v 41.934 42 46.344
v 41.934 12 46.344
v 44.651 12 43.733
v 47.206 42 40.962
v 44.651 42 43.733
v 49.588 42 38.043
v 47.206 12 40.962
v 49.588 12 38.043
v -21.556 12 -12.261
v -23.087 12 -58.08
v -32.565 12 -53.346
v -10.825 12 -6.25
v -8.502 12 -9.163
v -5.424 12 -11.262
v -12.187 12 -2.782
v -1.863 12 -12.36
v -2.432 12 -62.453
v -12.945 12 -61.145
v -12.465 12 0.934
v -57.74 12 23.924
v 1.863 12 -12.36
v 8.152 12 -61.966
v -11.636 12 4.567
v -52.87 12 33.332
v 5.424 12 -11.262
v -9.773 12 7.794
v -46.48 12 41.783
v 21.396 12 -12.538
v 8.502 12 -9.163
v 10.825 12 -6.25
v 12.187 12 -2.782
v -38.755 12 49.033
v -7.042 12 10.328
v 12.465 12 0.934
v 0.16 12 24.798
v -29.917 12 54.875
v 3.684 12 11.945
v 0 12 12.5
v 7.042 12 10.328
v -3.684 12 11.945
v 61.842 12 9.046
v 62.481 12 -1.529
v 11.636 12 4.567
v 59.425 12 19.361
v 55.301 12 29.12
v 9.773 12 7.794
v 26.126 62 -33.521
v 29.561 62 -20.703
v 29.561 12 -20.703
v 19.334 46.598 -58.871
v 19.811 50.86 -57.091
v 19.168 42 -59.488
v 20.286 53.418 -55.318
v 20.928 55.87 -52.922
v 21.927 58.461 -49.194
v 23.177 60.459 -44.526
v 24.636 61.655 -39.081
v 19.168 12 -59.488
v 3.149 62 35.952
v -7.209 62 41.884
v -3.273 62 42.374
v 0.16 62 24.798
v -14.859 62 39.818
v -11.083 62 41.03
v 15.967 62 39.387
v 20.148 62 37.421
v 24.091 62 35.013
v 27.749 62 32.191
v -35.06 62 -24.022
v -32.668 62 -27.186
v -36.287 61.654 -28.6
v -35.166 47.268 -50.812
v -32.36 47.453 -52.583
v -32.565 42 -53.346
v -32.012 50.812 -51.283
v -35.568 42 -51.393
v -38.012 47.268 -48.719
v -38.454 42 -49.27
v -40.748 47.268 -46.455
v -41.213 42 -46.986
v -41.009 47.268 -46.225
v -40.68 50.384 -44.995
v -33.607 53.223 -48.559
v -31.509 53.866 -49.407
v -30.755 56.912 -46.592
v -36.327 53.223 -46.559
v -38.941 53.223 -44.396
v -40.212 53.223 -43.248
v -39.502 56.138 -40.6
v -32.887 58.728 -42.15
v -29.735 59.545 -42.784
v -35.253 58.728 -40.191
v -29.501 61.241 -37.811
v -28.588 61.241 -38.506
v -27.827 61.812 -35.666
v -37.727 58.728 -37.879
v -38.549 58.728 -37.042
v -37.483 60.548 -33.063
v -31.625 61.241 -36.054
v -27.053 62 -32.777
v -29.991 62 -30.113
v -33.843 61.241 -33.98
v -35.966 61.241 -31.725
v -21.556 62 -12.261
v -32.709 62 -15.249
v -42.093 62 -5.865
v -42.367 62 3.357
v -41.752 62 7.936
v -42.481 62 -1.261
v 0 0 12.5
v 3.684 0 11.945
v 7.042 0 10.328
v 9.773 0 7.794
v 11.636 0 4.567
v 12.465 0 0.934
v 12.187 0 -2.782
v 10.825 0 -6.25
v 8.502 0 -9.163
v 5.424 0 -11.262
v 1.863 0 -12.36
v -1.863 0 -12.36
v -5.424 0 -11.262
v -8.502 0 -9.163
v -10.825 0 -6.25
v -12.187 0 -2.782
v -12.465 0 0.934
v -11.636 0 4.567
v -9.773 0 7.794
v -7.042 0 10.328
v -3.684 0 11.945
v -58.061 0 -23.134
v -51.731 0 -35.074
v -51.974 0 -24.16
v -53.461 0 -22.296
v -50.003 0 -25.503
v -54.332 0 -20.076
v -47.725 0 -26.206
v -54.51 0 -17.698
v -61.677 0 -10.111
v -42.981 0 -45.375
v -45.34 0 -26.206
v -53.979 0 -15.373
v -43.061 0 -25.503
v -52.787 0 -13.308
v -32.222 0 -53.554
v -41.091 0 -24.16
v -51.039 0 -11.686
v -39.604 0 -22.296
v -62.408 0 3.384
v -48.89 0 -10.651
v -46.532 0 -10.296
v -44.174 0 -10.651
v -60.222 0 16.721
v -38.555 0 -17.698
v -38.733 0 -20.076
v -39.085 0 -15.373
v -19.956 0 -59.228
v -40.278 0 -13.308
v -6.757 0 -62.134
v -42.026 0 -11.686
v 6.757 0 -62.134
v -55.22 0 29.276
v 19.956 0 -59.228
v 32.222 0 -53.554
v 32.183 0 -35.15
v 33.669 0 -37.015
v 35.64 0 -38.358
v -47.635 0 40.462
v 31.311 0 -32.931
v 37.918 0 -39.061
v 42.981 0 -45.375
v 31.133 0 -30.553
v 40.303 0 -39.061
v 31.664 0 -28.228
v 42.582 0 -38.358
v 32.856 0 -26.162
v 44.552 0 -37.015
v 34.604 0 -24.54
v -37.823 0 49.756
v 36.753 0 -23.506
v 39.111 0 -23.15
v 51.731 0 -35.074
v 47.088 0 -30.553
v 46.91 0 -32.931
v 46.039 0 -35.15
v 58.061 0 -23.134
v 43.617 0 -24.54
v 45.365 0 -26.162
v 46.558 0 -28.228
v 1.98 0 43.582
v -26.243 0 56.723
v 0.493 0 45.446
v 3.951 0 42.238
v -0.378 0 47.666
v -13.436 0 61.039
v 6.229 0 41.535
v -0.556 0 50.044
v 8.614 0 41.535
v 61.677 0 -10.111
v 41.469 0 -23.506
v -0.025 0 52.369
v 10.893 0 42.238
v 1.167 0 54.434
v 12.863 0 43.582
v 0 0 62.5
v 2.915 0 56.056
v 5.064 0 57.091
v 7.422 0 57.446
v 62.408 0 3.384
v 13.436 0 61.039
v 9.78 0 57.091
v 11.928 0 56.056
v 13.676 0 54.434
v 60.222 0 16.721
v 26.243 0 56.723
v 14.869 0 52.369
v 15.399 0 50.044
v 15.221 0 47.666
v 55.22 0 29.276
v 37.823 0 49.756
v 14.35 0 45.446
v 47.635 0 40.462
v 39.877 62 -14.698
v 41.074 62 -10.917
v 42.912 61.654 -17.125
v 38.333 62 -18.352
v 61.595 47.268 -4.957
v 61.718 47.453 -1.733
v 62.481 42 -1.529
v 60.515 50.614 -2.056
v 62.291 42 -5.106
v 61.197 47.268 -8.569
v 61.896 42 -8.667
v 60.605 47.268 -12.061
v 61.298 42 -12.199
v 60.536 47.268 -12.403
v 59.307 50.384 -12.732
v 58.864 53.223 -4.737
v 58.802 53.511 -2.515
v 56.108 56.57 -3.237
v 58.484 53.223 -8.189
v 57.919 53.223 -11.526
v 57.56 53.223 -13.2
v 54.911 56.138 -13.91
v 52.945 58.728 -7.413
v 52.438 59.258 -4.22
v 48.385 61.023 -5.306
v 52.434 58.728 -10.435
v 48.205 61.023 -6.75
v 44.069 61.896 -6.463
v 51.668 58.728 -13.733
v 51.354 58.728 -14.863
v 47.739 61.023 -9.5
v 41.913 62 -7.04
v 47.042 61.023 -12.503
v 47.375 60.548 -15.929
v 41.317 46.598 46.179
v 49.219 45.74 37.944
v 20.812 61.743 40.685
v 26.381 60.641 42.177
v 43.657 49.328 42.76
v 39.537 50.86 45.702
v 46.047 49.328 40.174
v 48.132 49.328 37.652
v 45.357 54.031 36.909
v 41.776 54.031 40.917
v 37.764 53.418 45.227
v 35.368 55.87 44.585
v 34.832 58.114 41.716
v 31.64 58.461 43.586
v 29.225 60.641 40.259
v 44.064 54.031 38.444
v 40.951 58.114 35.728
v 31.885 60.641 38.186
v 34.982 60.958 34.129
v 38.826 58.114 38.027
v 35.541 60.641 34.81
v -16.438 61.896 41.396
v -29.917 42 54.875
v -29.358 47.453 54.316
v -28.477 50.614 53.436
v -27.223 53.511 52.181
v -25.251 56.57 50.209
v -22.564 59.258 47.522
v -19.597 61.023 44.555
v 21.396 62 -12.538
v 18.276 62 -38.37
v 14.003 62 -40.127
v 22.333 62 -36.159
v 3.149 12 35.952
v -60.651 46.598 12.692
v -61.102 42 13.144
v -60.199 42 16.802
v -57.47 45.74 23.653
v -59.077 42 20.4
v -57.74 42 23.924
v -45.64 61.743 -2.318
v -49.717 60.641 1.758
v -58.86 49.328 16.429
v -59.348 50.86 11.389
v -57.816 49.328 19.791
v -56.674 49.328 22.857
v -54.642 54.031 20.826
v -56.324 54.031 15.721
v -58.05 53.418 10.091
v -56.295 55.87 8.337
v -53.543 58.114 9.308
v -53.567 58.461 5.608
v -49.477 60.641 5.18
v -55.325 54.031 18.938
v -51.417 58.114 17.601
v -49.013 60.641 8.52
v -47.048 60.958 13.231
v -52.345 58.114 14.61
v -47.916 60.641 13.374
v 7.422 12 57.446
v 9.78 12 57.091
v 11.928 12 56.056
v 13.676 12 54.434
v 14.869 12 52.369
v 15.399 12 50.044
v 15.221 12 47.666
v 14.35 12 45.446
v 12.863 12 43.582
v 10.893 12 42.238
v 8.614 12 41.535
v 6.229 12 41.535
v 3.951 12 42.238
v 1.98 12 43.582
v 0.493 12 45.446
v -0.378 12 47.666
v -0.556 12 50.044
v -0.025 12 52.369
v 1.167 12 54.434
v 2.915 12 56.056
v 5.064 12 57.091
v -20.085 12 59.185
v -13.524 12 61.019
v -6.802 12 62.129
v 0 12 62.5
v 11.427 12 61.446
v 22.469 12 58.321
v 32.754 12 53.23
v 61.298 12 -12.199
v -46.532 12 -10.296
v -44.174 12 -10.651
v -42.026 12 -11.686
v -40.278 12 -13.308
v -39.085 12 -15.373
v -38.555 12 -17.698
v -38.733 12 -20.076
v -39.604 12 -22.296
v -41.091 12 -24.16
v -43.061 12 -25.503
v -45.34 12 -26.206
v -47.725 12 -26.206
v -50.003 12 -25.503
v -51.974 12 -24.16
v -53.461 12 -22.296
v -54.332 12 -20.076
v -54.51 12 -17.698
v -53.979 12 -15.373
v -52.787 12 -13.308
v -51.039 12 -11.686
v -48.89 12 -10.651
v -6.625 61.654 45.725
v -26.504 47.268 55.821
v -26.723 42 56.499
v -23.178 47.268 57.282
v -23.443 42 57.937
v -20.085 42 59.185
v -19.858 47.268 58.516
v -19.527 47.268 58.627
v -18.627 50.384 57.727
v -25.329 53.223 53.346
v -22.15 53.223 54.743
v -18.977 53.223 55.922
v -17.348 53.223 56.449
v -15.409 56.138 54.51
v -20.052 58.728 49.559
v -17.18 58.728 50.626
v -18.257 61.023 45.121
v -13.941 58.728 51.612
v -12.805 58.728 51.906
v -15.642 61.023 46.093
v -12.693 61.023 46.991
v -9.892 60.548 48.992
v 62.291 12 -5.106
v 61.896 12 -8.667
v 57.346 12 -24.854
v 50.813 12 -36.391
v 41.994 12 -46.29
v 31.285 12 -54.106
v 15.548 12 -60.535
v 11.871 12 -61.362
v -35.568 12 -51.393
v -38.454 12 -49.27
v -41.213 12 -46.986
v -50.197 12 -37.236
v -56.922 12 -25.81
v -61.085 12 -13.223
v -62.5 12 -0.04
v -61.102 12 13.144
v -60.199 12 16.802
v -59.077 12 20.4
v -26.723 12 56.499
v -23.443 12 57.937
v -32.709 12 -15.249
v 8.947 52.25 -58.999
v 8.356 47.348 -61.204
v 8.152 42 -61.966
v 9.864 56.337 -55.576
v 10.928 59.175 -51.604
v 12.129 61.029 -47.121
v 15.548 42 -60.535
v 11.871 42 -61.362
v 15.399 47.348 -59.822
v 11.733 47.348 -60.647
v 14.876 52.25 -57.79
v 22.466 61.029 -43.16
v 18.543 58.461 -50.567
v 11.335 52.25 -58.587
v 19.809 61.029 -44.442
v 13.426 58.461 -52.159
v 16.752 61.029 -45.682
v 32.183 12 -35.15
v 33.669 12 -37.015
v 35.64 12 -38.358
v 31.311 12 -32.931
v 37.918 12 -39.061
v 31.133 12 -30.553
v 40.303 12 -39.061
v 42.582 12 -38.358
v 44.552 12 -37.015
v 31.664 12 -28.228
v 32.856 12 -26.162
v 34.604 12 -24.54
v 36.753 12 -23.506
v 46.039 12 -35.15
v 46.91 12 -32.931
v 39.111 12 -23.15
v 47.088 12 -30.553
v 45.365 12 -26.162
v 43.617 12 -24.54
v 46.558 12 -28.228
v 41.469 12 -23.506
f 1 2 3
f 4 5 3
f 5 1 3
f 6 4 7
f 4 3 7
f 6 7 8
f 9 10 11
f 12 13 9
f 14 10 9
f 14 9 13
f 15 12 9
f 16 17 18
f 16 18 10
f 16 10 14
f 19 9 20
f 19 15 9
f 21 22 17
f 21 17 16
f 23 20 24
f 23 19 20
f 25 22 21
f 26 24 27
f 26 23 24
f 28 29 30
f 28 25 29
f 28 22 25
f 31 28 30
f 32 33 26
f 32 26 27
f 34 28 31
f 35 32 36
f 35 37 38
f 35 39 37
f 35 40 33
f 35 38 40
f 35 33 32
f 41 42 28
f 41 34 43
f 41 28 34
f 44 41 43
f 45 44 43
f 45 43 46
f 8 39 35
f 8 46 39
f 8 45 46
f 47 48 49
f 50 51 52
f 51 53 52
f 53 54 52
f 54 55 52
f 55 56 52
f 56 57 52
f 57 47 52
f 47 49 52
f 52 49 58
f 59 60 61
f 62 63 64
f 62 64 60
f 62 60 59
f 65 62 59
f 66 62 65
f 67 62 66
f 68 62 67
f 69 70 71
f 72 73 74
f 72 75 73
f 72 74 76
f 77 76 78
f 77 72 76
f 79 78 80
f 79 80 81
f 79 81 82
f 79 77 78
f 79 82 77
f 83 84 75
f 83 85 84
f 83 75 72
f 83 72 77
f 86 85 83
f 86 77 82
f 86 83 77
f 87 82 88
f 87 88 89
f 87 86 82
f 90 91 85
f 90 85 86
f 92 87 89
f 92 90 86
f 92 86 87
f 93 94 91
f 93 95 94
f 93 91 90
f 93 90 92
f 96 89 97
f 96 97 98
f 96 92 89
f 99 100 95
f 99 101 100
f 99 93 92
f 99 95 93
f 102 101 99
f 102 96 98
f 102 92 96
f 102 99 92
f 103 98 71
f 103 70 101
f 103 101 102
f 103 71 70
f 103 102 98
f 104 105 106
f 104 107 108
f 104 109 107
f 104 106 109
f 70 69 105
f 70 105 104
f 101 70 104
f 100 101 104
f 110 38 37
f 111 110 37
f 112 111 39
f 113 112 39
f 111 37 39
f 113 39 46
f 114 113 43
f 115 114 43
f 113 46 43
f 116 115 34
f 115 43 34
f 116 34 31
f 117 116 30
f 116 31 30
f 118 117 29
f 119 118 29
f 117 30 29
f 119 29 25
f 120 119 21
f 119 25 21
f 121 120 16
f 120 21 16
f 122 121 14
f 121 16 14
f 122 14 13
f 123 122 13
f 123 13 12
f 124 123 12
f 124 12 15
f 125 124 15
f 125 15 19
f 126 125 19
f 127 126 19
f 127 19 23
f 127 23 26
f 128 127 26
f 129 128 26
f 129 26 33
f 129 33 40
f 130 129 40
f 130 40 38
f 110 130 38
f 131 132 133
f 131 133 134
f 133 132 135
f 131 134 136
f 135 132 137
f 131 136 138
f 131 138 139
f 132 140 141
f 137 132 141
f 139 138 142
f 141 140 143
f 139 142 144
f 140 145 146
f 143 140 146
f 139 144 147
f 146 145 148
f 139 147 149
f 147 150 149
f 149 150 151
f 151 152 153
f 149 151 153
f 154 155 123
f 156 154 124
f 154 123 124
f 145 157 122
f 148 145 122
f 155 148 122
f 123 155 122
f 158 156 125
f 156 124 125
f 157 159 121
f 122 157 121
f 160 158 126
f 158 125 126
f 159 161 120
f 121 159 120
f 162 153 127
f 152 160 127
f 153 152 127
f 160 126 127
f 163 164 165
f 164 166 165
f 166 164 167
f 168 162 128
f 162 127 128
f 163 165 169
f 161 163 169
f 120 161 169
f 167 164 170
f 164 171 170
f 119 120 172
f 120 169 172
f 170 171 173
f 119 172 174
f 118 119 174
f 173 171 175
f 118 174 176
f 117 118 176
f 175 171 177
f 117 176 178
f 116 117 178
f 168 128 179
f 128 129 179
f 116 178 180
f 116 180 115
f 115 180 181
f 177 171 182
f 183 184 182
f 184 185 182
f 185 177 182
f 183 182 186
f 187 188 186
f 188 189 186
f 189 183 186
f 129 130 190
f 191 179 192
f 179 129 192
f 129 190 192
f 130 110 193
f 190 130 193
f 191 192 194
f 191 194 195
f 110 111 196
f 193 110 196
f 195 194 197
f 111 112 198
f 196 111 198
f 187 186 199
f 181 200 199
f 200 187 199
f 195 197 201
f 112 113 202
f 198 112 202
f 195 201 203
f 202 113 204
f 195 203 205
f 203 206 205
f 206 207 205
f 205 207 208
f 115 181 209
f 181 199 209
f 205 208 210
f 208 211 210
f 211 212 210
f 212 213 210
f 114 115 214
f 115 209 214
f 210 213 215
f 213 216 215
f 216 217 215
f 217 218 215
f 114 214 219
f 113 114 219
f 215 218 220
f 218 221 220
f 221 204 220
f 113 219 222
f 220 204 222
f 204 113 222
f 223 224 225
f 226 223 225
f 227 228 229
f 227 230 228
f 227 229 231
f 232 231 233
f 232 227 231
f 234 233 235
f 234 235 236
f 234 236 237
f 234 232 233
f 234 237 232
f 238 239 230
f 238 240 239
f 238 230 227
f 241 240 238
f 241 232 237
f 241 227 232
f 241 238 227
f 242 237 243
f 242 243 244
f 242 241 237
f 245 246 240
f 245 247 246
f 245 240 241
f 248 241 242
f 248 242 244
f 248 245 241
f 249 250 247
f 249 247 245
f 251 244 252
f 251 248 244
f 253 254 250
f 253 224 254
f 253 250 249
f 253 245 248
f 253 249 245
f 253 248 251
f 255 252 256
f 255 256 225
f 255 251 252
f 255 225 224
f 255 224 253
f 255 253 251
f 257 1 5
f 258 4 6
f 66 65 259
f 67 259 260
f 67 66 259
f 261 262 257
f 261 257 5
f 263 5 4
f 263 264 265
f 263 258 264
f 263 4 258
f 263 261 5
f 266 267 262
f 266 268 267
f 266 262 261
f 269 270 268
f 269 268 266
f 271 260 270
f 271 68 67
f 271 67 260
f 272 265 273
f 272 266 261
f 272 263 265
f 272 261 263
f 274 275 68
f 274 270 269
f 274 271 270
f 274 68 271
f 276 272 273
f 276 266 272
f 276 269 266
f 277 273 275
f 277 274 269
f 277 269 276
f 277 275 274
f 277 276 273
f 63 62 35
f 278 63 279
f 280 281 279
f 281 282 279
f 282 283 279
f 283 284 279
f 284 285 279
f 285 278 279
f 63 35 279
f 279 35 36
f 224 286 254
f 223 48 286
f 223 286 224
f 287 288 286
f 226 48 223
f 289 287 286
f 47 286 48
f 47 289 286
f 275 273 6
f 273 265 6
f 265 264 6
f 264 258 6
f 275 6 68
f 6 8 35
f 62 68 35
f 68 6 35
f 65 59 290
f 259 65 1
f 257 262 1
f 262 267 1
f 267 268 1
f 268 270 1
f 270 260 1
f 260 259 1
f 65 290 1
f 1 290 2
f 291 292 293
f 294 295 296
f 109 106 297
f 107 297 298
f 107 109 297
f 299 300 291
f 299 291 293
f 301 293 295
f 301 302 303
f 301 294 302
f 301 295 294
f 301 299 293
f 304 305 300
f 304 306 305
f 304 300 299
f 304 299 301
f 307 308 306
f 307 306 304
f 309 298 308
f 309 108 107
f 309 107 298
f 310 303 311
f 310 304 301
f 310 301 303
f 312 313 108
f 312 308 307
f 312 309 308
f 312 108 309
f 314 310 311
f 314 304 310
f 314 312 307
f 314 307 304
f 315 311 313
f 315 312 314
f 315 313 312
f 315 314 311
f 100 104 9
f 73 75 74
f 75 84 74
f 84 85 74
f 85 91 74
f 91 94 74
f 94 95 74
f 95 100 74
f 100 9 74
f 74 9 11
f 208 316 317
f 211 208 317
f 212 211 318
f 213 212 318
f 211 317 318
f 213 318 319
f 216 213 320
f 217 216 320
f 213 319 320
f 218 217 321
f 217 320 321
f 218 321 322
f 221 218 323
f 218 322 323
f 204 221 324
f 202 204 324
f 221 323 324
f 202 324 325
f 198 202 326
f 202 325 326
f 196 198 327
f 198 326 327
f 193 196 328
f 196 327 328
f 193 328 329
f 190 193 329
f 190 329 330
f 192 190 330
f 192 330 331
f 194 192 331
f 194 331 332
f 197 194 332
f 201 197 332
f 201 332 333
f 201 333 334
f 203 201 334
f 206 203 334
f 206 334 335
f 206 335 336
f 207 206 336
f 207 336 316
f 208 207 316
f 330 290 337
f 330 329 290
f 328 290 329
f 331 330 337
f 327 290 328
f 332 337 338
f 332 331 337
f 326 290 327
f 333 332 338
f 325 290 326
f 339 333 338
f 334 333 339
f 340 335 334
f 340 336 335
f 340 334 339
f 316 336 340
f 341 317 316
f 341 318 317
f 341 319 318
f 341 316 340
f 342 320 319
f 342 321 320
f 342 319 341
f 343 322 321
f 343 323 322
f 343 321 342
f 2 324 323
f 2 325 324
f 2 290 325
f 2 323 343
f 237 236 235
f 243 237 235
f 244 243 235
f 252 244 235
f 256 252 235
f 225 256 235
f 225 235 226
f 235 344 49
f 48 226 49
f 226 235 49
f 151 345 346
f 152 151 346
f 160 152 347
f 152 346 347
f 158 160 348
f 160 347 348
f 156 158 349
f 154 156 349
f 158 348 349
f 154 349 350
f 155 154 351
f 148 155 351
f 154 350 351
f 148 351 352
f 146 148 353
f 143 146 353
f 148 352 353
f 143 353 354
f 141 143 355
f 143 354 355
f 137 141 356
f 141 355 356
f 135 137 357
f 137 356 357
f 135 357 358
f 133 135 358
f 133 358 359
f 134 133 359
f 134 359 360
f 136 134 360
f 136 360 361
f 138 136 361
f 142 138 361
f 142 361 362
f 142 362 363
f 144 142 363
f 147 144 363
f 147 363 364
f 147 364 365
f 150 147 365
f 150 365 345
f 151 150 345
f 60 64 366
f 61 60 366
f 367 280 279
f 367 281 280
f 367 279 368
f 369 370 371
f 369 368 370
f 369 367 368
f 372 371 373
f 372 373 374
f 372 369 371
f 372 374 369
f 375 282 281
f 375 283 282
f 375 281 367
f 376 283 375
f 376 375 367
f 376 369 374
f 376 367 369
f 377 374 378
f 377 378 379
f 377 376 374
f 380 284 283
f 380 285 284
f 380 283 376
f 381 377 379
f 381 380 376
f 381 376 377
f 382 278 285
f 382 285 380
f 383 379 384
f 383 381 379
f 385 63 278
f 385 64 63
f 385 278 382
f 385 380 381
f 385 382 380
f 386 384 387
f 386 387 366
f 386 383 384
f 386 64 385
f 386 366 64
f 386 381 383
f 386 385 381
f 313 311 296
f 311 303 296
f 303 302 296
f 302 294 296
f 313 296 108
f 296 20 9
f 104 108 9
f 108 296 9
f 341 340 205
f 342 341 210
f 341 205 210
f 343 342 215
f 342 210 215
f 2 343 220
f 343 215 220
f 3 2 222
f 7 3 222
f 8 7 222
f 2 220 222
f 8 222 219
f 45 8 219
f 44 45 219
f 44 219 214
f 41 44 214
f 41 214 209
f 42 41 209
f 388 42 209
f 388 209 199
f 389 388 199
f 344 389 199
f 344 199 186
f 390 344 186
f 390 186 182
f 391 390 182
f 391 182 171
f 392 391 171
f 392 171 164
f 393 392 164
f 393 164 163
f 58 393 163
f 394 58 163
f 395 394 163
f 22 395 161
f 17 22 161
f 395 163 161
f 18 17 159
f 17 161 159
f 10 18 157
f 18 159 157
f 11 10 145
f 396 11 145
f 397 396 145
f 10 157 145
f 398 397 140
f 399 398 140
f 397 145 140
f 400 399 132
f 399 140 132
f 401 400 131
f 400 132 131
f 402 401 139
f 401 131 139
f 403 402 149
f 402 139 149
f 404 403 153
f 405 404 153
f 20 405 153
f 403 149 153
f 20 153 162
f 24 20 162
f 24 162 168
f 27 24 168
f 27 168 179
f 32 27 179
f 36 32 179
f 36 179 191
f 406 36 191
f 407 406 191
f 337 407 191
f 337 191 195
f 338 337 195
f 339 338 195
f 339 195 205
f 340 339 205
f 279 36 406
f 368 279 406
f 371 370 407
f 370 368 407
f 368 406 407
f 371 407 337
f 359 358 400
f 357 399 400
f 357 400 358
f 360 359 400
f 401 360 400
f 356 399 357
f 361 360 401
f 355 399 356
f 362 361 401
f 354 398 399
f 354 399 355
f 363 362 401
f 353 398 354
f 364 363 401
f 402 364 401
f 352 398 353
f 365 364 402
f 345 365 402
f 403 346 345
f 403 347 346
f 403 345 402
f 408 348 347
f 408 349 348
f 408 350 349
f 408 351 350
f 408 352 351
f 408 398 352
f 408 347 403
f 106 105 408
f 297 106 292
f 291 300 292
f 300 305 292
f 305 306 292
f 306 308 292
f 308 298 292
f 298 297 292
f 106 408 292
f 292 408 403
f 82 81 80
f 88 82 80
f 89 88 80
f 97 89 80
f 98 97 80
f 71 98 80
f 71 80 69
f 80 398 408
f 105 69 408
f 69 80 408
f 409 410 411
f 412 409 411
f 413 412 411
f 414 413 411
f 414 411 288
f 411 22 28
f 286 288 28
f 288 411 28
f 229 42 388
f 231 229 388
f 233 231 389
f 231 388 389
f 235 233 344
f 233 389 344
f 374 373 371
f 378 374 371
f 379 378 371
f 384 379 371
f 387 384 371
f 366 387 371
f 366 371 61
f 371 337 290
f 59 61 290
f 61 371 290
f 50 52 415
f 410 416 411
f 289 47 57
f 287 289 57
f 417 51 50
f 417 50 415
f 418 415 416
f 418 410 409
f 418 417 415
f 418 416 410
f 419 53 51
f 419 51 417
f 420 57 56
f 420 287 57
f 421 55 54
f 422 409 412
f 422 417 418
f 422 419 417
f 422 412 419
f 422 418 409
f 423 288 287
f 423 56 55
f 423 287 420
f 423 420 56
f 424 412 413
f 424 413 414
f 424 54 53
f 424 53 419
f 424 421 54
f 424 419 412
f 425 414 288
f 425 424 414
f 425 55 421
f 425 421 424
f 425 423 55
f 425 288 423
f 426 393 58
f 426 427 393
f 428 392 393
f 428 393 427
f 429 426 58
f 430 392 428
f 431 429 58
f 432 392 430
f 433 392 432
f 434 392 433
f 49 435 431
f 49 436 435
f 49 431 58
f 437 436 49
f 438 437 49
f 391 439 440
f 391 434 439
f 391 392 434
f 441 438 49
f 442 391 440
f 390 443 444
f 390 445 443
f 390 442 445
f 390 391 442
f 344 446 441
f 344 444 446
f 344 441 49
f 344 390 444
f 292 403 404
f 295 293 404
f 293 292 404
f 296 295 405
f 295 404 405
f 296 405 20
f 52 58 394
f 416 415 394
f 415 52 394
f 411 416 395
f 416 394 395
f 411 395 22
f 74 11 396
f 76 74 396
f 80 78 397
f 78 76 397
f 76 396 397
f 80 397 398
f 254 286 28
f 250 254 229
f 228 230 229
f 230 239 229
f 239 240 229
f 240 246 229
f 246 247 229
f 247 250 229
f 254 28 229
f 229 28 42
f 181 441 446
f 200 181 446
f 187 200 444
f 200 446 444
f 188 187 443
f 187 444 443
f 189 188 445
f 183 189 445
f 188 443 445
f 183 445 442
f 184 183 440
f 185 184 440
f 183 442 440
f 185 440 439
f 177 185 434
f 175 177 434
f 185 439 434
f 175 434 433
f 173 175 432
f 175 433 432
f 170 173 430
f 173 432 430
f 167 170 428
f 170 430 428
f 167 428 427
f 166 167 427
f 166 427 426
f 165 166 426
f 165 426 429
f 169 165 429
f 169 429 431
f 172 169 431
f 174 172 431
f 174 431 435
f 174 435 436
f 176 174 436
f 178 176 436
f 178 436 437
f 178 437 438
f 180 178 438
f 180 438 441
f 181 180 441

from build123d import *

# Parameters (mm, degrees)
SKETCH1_R           = 62.5
BOSS_EXTRUDE1_DEPTH = 12
BOSS_EXTRUDE2_DEPTH = 50
FILLET1_R           = 20
SKETCH3_R           = 12.5
CUT_EXTRUDE1_DEPTH  = 50
SKETCH4_R           = 8
CUT_EXTRUDE2_DEPTH  = 50


with BuildPart() as part:
    # Sketch1 → Boss-Extrude1 (new body)
    with BuildSketch(Plane(origin=(0, 0, 0), x_dir=(1, 0, 0), z_dir=(0, 1, 0))):
        with Locations(Location((0, 0, 0), (0, 0, 270))):
            Circle(SKETCH1_R)
    extrude(amount=BOSS_EXTRUDE1_DEPTH)

    # Sketch2 → Boss-Extrude2 (add)
    with BuildSketch(Plane(origin=(0, 12, 0), x_dir=(1, 0, 0), z_dir=(0, 1, 0))):
        with BuildLine():
            ThreePointArc((19.168323988, 59.488026993), (13.716019775, 60.976395446), (8.151554557, 61.96613719))
            Line((8.151554557, 61.96613719), (21.395866241, 12.537693074))
            Line((21.395866241, 12.537693074), (62.481297287, 1.528885005))
            ThreePointArc((62.481297287, 1.528885005), (62.119144902, 6.889255161), (61.297971235, 12.198718069))
            Line((61.297971235, 12.198718069), (29.560832051, 20.702658884))
            Line((29.560832051, 20.702658884), (19.168323988, 59.488026993))
        make_face()
        with BuildLine():
            ThreePointArc((41.933980603, -46.344269018), (45.9490976, -42.366619287), (49.588471703, -38.042521922))
            Line((49.588471703, -38.042521922), (0.160027587, -24.798210238))
            Line((0.160027587, -24.798210238), (-29.91659539, -54.874833214))
            ThreePointArc((-29.91659539, -54.874833214), (-25.093302468, -57.241385127), (-20.084585876, -59.184959324))
            Line((-20.084585876, -59.184959324), (3.148612494, -35.951760955))
            Line((3.148612494, -35.951760955), (41.933980603, -46.344269018))
        make_face()
        with BuildLine():
            ThreePointArc((-61.102304591, -13.143757975), (-59.665117375, -18.609776159), (-57.74002626, -23.923615268))
            Line((-57.74002626, -23.923615268), (-21.555893828, 12.260517164))
            Line((-21.555893828, 12.260517164), (-32.564701897, 53.345948209))
            ThreePointArc((-32.564701897, 53.345948209), (-37.025842434, 50.352129966), (-41.213385359, 46.986241255))
            Line((-41.213385359, 46.986241255), (-32.709444544, 15.249102071))
            Line((-32.709444544, 15.249102071), (-61.102304591, -13.143757975))
        make_face()
    extrude(amount=BOSS_EXTRUDE2_DEPTH)

    # Fillet1
    # the kernel refuses this fillet: 20 mm, written as the material it takes off along each edge
    with BuildSketch(Plane(origin=(0, 62, 0), x_dir=(0.24928364261100788, 0, -0.9684305166229467), z_dir=(0.9684305166229467, 0, 0.24928364261100788))) as fillet1_piece_1:
        with BuildLine():
            CenterArc((62.5 - FILLET1_R, -FILLET1_R), FILLET1_R, 0, 90)
            Line((62.5 - FILLET1_R, 0), (62.5, 0))
            Line((62.5, 0), (62.5, -FILLET1_R))
        make_face()
    revolve(axis=Axis((0, 62, 0), (0, 1, 0)), revolution_arc=101.527179198, mode=Mode.SUBTRACT)
    with BuildSketch(Plane(origin=(0, 62, 0), x_dir=(-0.8319838819593003, 0, -0.5547998018744537), z_dir=(0.5547998018744537, 0, -0.8319838819593003))) as fillet1_piece_2:
        with BuildLine():
            CenterArc((62.5 - FILLET1_R, -FILLET1_R), FILLET1_R, 0, 90)
            Line((62.5 - FILLET1_R, 0), (62.5, 0))
            Line((62.5, 0), (62.5, -FILLET1_R))
        make_face()
    revolve(axis=Axis((0, 62, 0), (0, 1, 0)), revolution_arc=102.039649765, mode=Mode.SUBTRACT)
    with BuildSketch(Plane(origin=(0, 62, 0), x_dir=(-0.9633272505010871, 0, 0.26832929106233594), z_dir=(-0.26832929106233594, 0, -0.9633272505010871))) as fillet1_piece_3:
        with BuildLine():
            CenterArc((62.5 - FILLET1_R, -FILLET1_R), FILLET1_R, 0, 90)
            Line((62.5 - FILLET1_R, 0), (62.5, 0))
            Line((62.5, 0), (62.5, -FILLET1_R))
        make_face()
    revolve(axis=Axis((0, 62, 0), (0, 1, 0)), revolution_arc=101.527179198, mode=Mode.SUBTRACT)
    with BuildSketch(Plane(origin=(0, 62, 0), x_dir=(-0.06447878145815908, 0, 0.9979190782531773), z_dir=(-0.9979190782531773, 0, -0.06447878145815908))) as fillet1_piece_4:
        with BuildLine():
            CenterArc((62.5 - FILLET1_R, -FILLET1_R), FILLET1_R, 0, 90)
            Line((62.5 - FILLET1_R, 0), (62.5, 0))
            Line((62.5, 0), (62.5, -FILLET1_R))
        make_face()
    revolve(axis=Axis((0, 62, 0), (0, 1, 0)), revolution_arc=102.039649765, mode=Mode.SUBTRACT)
    with BuildSketch(Plane(origin=(0, 62, 0), x_dir=(0.8964626634174491, 0, -0.443119276378825), z_dir=(0.443119276378825, 0, 0.8964626634174491))) as fillet1_piece_5:
        with BuildLine():
            CenterArc((62.5 - FILLET1_R, -FILLET1_R), FILLET1_R, 0, 90)
            Line((62.5 - FILLET1_R, 0), (62.5, 0))
            Line((62.5, 0), (62.5, -FILLET1_R))
        make_face()
    revolve(axis=Axis((0, 62, 0), (0, 1, 0)), revolution_arc=102.039649765, mode=Mode.SUBTRACT)
    with BuildSketch(Plane(origin=(0, 62, 0), x_dir=(0.7140436078899985, 0, 0.7001012255605856), z_dir=(-0.7001012255605856, 0, 0.7140436078899985))) as fillet1_piece_6:
        with BuildLine():
            CenterArc((62.5 - FILLET1_R, -FILLET1_R), FILLET1_R, 0, 90)
            Line((62.5 - FILLET1_R, 0), (62.5, 0))
            Line((62.5, 0), (62.5, -FILLET1_R))
        make_face()
    revolve(axis=Axis((0, 62, 0), (0, 1, 0)), revolution_arc=101.527179198, mode=Mode.SUBTRACT)

    # Sketch3 → Cut-Extrude1 (cut)
    with BuildSketch(Plane(origin=(0, 12, 0), x_dir=(1, 0, 0), z_dir=(0, 1, 0))):
        with Locations(Location((0, 0, 0), (0, 0, 270))):
            Circle(SKETCH3_R)
    extrude(amount=-CUT_EXTRUDE1_DEPTH, mode=Mode.SUBTRACT)

    # Sketch4 → Cut-Extrude2 (cut)
    with BuildSketch(Plane(origin=(0, 12, 0), x_dir=(1, 0, 0), z_dir=(0, 1, 0))):
        with Locations(Location((39.110778617, 31.150393192, 0), (0, 0, 270))):
            Circle(SKETCH4_R)
        with Locations(Location((7.421642534, -49.44612444, 0), (0, 0, 270))):
            Circle(SKETCH4_R)
        with Locations(Location((-46.53242115, 18.295731248, 0), (0, 0, 270))):
            Circle(SKETCH4_R)
    extrude(amount=-CUT_EXTRUDE2_DEPTH, mode=Mode.SUBTRACT)


solid = part.part
